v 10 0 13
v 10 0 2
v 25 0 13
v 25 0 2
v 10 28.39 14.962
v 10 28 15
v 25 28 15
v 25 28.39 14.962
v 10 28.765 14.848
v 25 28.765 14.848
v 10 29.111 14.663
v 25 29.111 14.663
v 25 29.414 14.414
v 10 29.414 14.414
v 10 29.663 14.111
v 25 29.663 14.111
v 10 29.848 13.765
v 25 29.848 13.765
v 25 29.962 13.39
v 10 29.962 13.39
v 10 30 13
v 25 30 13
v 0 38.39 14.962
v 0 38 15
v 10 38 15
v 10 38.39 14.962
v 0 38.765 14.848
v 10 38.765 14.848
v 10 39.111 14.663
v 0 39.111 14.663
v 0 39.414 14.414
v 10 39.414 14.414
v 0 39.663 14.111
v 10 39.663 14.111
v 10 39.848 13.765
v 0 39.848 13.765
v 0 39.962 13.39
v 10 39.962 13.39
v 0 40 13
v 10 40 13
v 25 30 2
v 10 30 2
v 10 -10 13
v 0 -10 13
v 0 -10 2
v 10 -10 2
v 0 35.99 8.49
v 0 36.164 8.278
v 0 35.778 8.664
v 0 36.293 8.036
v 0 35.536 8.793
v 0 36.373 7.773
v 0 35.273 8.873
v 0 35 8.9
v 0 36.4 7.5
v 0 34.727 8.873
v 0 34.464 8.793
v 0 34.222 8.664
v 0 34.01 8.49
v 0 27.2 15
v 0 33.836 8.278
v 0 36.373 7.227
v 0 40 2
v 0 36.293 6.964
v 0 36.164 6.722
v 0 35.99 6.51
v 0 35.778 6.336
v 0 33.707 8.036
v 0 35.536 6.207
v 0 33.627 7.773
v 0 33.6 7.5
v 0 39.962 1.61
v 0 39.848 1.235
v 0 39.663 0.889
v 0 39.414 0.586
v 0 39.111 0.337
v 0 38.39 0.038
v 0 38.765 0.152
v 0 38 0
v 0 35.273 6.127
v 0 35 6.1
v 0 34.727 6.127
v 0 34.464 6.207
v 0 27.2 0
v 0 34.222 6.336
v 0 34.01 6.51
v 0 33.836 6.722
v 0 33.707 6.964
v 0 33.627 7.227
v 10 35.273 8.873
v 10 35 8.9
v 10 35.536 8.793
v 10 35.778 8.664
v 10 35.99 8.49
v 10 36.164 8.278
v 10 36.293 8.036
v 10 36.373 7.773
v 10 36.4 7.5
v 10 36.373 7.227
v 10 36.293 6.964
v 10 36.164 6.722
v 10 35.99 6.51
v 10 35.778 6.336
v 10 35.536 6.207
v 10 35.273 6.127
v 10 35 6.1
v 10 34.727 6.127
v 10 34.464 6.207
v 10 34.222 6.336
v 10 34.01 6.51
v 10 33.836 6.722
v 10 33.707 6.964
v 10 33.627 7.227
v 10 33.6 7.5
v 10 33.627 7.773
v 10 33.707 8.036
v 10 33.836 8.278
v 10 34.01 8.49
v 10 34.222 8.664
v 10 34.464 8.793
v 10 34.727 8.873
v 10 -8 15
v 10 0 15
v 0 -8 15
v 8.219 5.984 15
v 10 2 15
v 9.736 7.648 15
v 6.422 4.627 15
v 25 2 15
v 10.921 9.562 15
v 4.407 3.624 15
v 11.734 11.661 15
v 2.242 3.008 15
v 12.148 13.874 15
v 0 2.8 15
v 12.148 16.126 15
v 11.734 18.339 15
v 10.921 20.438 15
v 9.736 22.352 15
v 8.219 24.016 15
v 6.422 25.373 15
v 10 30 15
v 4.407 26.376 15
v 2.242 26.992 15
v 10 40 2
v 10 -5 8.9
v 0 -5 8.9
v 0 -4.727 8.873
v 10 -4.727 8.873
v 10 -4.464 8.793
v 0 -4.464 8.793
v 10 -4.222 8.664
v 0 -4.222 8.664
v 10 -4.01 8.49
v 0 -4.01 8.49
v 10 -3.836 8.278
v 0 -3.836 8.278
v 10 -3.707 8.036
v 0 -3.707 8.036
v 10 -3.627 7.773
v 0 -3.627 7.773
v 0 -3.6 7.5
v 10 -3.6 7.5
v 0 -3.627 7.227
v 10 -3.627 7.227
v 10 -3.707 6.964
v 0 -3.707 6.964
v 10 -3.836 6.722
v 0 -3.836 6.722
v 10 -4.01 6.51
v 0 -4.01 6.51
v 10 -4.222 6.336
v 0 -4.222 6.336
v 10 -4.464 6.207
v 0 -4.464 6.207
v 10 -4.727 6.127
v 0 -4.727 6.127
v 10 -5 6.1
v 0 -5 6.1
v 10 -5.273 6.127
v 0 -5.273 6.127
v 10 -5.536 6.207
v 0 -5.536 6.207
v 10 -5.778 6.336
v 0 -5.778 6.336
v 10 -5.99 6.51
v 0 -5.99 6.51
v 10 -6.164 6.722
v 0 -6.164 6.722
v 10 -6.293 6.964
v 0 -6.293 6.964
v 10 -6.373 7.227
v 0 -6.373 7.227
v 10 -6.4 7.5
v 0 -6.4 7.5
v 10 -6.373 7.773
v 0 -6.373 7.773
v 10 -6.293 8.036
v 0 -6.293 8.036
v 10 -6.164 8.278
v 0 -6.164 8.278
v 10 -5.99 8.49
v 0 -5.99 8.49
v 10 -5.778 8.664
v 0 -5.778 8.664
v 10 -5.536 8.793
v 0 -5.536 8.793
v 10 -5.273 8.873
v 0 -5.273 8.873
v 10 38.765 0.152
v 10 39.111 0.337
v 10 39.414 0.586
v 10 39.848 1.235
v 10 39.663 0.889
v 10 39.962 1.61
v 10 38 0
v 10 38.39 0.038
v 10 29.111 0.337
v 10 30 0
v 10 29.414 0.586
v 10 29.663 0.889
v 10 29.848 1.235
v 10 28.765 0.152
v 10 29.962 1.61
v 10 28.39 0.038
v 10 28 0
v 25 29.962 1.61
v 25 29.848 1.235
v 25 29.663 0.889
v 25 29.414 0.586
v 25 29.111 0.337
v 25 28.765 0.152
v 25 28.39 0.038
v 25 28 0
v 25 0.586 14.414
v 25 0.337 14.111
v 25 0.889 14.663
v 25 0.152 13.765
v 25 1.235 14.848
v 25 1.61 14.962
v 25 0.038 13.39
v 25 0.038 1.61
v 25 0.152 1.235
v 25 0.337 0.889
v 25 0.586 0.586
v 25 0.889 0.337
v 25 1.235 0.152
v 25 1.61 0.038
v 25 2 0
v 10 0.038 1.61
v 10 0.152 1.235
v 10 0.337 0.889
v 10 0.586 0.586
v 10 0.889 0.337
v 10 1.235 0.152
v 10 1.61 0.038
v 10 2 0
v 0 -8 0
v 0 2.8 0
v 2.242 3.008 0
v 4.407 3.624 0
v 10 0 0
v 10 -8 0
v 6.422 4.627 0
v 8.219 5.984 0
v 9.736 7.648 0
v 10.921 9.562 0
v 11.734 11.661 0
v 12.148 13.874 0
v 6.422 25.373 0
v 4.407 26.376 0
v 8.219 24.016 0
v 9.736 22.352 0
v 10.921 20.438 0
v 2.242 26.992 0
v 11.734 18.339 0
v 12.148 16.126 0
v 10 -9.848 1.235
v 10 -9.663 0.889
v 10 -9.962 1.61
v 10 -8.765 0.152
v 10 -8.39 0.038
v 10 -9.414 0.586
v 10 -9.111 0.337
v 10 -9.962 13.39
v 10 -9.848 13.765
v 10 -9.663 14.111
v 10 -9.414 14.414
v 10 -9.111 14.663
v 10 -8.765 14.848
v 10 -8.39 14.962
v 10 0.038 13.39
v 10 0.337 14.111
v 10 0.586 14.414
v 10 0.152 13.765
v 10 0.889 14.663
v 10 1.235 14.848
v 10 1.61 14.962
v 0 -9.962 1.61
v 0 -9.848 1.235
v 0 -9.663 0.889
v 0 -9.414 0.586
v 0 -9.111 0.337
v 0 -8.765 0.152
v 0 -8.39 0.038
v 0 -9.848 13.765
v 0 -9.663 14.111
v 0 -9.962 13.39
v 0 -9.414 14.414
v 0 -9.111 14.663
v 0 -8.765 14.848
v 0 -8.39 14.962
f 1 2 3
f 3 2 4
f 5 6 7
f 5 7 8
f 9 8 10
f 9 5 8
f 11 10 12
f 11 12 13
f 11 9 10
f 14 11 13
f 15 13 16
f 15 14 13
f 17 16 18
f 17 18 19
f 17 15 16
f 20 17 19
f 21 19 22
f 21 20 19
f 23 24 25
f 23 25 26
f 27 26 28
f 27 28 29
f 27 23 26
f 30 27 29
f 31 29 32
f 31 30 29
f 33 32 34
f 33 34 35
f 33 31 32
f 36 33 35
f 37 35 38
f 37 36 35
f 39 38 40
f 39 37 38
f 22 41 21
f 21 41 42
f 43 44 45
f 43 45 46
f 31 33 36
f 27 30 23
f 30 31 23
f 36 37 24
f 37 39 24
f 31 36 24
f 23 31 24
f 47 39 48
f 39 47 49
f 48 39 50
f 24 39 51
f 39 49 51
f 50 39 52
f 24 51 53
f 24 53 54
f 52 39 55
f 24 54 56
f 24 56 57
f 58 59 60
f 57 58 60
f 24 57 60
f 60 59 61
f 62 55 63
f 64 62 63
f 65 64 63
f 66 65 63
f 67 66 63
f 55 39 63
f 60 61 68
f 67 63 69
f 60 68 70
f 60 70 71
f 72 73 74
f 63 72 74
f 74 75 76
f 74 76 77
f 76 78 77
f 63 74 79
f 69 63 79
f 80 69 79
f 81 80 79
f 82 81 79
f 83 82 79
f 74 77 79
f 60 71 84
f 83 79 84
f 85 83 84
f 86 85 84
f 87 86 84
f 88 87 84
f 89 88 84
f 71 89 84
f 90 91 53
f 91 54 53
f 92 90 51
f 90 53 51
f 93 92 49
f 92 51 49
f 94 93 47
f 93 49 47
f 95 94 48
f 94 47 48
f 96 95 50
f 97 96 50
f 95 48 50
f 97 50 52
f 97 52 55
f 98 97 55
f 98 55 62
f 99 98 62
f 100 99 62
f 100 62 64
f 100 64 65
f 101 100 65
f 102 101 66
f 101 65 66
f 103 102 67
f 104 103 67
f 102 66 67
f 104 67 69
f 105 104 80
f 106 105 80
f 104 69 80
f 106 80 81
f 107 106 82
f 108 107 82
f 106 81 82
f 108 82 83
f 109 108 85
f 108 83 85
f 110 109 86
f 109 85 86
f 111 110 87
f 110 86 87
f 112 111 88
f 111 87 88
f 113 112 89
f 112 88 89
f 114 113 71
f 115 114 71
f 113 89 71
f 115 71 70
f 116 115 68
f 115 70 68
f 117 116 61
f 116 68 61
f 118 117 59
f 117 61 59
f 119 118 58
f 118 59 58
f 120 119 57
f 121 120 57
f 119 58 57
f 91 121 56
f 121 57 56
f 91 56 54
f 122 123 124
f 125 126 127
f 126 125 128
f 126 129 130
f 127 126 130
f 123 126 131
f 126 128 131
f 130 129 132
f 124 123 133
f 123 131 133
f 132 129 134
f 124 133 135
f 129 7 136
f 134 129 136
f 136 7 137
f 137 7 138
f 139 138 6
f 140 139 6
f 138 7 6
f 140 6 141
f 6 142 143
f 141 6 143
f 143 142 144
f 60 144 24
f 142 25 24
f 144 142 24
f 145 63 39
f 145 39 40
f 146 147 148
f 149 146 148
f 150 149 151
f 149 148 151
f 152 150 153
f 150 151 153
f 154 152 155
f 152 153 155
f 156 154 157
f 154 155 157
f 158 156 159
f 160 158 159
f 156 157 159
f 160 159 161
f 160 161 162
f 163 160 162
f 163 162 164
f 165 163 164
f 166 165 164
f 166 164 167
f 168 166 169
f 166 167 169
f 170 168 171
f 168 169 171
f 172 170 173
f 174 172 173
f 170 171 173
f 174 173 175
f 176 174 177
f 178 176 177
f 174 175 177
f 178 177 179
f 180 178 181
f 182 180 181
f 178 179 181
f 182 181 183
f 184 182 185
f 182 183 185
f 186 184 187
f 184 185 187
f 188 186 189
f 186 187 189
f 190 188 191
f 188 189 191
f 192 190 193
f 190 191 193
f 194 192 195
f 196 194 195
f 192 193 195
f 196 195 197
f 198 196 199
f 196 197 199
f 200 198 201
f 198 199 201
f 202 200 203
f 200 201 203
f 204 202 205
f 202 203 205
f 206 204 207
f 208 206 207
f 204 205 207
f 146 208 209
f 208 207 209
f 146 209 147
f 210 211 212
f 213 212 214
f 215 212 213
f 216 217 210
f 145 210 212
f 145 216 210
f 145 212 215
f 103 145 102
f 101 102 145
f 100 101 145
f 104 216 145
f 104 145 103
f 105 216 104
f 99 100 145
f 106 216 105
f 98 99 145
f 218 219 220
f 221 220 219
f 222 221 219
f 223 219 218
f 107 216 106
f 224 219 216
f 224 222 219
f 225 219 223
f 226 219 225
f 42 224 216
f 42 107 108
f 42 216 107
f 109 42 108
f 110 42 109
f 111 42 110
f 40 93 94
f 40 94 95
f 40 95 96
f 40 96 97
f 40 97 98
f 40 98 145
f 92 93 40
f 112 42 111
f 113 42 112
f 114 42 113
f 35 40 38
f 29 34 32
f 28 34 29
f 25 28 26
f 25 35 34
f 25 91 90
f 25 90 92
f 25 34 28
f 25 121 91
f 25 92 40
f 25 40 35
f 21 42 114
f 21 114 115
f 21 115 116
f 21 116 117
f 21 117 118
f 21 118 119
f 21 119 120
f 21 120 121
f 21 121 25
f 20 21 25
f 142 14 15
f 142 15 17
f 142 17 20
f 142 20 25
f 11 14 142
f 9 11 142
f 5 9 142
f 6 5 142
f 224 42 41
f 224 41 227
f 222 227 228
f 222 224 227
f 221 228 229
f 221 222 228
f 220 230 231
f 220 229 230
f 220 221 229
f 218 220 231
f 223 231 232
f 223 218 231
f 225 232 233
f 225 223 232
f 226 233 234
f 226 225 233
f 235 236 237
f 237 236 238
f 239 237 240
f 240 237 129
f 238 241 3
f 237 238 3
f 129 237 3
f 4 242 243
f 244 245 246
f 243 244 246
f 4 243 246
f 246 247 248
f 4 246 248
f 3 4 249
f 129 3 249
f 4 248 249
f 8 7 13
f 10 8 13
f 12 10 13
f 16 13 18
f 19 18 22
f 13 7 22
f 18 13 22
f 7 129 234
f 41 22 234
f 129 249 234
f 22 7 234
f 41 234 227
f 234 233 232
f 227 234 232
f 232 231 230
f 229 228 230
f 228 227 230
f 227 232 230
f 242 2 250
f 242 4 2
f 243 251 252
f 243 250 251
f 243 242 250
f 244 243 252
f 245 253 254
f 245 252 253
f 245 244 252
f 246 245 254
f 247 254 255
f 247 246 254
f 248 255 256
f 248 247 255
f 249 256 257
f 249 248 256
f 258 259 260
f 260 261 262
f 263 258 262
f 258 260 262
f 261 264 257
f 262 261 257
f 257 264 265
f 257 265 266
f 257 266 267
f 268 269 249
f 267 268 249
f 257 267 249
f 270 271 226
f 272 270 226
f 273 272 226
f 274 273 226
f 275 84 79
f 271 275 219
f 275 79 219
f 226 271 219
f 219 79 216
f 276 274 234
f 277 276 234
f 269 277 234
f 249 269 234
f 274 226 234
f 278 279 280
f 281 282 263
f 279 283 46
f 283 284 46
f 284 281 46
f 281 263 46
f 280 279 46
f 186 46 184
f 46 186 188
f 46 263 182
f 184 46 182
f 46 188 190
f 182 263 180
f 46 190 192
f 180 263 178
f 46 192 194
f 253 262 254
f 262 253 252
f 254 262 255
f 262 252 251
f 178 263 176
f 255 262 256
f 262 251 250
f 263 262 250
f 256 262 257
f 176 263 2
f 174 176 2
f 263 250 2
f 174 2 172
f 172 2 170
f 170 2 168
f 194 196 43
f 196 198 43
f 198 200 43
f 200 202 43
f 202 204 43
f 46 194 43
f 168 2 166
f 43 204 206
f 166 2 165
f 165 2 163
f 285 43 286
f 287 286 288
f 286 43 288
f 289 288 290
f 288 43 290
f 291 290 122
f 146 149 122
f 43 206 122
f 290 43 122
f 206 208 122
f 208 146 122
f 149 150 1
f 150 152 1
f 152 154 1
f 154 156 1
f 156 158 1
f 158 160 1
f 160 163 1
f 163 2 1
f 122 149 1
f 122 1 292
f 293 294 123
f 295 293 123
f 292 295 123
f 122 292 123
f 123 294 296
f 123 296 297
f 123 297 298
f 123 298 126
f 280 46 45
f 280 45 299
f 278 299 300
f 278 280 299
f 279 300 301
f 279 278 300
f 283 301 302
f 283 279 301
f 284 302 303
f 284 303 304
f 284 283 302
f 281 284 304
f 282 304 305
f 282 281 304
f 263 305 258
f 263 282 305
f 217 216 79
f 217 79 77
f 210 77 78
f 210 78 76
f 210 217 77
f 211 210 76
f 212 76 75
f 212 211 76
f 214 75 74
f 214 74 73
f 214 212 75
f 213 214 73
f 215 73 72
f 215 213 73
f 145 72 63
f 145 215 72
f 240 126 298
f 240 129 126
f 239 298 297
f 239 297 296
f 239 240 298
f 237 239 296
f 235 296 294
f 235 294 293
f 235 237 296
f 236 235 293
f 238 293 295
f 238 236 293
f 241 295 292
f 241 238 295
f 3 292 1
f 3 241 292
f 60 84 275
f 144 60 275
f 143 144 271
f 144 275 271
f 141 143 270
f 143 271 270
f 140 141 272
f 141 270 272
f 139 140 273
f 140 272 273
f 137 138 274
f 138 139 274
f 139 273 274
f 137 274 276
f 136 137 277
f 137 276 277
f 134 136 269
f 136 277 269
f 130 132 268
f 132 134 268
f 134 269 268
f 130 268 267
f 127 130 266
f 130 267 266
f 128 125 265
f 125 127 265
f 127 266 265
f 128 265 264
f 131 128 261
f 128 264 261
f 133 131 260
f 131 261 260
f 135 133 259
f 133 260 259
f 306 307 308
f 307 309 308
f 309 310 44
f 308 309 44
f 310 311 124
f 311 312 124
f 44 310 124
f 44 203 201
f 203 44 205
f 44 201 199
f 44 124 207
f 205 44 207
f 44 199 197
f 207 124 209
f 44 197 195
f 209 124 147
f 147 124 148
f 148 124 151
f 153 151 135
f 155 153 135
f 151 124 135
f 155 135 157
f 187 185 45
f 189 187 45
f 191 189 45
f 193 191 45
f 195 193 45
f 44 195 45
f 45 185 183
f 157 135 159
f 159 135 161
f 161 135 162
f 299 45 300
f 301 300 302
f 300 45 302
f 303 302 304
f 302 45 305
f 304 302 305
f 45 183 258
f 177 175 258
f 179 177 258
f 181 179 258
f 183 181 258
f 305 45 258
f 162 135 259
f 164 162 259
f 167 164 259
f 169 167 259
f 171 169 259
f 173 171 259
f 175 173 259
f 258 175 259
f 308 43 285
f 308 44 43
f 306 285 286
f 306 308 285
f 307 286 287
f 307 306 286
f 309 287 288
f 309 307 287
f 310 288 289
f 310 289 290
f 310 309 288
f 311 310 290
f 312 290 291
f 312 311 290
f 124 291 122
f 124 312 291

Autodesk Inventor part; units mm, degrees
ref_plane "YZ Plane" through (0, 0, 0) normal (1, 0, 0) x (0, 1, 0)
ref_plane "XZ Plane" through (0, 0, 0) normal (0, 1, 0) x (-1, 0, 0)
ref_plane "XY Plane" through (0, 0, 0) normal (0, 0, 1) x (1, 0, 0)
sketch "Sketch1" plane through (0, 0, 0) normal (0, 0, 1) x (1, 0, 0)
  line L0 (0, 0) -> (25, 0)
  line L1 (25, 0) -> (25, 30)
  line L2 (25, 30) -> (0, 30)
  line L3 (0, 30) -> (0, 0)
  circle A0 centre (0, 15) radius 12.2
  point P0 (0, 27.2)
  point P1 (0, 2.8)
  dimension "d0" = 25
  dimension "d1" = 30
  dimension "d2" = 24.4
extrude "Extrusion1" add sketch "Sketch1" along normal blind 15 contours L3 A0 L2 L1 L0
sketch "Sketch2" plane through (0, 30, 0) normal (0, 1, 0) x (1, 0, 0)
  line L0 (0, 0) -> (10, 0)
  line L1 (10, 0) -> (10, -15)
  line L2 (10, -15) -> (0, -15)
  line L3 (0, -15) -> (0, 0)
  dimension "d5" = 10
  dimension "d6" = 15
extrude "Extrusion2" add sketch "Sketch2" along normal blind 10
sketch "Sketch3" plane through (0, 0, 0) normal (0, -1, 0) x (1, 0, 0)
  line L0 (25, 15) -> (10, 15) projected
  line L1 (0, 0) -> (10, 0)
  line L2 (10, 0) -> (10, 15)
  line L3 (10, 15) -> (0, 15)
  line L4 (0, 15) -> (0, 0)
extrude "Extrusion3" add sketch "Sketch3" along normal blind 10
sketch "Sketch4" plane through (0, 27.2, 0) normal (-1, 0, 0) x (0, 0, 1)
  circle A0 centre (7.5, 7.8) radius 1.4
  line L0 (0, 12.8) -> (0, 0) projected
  line L1 (0, 12.8) -> (15, 12.8) projected
  line L2 (0, 0) -> (0, -24.4) projected
  line L3 (0, -12.2) -> (15, -12.2)
  line L4 (15, -27.2) -> (15, 2.8) projected
  circle A1 centre (7.5, -32.2) radius 1.4
  point P0 (0, -27.2)
  point P1 (7.5, 12.8)
  dimension "d11" = 2.8
  dimension "d12" = 7.5
  dimension "d13" = 5
extrude "Extrusion4" cut sketch "Sketch4" against normal through all
fillet "Fillet1" radius 2 2 edges at (5, 40, 0) (5, 40, 15)
fillet "Fillet2" radius 2 1 edges at (5, -10, 0)
fillet "Fillet3" radius 2 1 edges at (5, -10, 15)
fillet "Fillet4" radius 2 4 edges at (17.5, 30, 15) (17.5, 30, 0) (17.5, 0, 15) (17.5, 0, 0)
properties part number "motor kapak1"
